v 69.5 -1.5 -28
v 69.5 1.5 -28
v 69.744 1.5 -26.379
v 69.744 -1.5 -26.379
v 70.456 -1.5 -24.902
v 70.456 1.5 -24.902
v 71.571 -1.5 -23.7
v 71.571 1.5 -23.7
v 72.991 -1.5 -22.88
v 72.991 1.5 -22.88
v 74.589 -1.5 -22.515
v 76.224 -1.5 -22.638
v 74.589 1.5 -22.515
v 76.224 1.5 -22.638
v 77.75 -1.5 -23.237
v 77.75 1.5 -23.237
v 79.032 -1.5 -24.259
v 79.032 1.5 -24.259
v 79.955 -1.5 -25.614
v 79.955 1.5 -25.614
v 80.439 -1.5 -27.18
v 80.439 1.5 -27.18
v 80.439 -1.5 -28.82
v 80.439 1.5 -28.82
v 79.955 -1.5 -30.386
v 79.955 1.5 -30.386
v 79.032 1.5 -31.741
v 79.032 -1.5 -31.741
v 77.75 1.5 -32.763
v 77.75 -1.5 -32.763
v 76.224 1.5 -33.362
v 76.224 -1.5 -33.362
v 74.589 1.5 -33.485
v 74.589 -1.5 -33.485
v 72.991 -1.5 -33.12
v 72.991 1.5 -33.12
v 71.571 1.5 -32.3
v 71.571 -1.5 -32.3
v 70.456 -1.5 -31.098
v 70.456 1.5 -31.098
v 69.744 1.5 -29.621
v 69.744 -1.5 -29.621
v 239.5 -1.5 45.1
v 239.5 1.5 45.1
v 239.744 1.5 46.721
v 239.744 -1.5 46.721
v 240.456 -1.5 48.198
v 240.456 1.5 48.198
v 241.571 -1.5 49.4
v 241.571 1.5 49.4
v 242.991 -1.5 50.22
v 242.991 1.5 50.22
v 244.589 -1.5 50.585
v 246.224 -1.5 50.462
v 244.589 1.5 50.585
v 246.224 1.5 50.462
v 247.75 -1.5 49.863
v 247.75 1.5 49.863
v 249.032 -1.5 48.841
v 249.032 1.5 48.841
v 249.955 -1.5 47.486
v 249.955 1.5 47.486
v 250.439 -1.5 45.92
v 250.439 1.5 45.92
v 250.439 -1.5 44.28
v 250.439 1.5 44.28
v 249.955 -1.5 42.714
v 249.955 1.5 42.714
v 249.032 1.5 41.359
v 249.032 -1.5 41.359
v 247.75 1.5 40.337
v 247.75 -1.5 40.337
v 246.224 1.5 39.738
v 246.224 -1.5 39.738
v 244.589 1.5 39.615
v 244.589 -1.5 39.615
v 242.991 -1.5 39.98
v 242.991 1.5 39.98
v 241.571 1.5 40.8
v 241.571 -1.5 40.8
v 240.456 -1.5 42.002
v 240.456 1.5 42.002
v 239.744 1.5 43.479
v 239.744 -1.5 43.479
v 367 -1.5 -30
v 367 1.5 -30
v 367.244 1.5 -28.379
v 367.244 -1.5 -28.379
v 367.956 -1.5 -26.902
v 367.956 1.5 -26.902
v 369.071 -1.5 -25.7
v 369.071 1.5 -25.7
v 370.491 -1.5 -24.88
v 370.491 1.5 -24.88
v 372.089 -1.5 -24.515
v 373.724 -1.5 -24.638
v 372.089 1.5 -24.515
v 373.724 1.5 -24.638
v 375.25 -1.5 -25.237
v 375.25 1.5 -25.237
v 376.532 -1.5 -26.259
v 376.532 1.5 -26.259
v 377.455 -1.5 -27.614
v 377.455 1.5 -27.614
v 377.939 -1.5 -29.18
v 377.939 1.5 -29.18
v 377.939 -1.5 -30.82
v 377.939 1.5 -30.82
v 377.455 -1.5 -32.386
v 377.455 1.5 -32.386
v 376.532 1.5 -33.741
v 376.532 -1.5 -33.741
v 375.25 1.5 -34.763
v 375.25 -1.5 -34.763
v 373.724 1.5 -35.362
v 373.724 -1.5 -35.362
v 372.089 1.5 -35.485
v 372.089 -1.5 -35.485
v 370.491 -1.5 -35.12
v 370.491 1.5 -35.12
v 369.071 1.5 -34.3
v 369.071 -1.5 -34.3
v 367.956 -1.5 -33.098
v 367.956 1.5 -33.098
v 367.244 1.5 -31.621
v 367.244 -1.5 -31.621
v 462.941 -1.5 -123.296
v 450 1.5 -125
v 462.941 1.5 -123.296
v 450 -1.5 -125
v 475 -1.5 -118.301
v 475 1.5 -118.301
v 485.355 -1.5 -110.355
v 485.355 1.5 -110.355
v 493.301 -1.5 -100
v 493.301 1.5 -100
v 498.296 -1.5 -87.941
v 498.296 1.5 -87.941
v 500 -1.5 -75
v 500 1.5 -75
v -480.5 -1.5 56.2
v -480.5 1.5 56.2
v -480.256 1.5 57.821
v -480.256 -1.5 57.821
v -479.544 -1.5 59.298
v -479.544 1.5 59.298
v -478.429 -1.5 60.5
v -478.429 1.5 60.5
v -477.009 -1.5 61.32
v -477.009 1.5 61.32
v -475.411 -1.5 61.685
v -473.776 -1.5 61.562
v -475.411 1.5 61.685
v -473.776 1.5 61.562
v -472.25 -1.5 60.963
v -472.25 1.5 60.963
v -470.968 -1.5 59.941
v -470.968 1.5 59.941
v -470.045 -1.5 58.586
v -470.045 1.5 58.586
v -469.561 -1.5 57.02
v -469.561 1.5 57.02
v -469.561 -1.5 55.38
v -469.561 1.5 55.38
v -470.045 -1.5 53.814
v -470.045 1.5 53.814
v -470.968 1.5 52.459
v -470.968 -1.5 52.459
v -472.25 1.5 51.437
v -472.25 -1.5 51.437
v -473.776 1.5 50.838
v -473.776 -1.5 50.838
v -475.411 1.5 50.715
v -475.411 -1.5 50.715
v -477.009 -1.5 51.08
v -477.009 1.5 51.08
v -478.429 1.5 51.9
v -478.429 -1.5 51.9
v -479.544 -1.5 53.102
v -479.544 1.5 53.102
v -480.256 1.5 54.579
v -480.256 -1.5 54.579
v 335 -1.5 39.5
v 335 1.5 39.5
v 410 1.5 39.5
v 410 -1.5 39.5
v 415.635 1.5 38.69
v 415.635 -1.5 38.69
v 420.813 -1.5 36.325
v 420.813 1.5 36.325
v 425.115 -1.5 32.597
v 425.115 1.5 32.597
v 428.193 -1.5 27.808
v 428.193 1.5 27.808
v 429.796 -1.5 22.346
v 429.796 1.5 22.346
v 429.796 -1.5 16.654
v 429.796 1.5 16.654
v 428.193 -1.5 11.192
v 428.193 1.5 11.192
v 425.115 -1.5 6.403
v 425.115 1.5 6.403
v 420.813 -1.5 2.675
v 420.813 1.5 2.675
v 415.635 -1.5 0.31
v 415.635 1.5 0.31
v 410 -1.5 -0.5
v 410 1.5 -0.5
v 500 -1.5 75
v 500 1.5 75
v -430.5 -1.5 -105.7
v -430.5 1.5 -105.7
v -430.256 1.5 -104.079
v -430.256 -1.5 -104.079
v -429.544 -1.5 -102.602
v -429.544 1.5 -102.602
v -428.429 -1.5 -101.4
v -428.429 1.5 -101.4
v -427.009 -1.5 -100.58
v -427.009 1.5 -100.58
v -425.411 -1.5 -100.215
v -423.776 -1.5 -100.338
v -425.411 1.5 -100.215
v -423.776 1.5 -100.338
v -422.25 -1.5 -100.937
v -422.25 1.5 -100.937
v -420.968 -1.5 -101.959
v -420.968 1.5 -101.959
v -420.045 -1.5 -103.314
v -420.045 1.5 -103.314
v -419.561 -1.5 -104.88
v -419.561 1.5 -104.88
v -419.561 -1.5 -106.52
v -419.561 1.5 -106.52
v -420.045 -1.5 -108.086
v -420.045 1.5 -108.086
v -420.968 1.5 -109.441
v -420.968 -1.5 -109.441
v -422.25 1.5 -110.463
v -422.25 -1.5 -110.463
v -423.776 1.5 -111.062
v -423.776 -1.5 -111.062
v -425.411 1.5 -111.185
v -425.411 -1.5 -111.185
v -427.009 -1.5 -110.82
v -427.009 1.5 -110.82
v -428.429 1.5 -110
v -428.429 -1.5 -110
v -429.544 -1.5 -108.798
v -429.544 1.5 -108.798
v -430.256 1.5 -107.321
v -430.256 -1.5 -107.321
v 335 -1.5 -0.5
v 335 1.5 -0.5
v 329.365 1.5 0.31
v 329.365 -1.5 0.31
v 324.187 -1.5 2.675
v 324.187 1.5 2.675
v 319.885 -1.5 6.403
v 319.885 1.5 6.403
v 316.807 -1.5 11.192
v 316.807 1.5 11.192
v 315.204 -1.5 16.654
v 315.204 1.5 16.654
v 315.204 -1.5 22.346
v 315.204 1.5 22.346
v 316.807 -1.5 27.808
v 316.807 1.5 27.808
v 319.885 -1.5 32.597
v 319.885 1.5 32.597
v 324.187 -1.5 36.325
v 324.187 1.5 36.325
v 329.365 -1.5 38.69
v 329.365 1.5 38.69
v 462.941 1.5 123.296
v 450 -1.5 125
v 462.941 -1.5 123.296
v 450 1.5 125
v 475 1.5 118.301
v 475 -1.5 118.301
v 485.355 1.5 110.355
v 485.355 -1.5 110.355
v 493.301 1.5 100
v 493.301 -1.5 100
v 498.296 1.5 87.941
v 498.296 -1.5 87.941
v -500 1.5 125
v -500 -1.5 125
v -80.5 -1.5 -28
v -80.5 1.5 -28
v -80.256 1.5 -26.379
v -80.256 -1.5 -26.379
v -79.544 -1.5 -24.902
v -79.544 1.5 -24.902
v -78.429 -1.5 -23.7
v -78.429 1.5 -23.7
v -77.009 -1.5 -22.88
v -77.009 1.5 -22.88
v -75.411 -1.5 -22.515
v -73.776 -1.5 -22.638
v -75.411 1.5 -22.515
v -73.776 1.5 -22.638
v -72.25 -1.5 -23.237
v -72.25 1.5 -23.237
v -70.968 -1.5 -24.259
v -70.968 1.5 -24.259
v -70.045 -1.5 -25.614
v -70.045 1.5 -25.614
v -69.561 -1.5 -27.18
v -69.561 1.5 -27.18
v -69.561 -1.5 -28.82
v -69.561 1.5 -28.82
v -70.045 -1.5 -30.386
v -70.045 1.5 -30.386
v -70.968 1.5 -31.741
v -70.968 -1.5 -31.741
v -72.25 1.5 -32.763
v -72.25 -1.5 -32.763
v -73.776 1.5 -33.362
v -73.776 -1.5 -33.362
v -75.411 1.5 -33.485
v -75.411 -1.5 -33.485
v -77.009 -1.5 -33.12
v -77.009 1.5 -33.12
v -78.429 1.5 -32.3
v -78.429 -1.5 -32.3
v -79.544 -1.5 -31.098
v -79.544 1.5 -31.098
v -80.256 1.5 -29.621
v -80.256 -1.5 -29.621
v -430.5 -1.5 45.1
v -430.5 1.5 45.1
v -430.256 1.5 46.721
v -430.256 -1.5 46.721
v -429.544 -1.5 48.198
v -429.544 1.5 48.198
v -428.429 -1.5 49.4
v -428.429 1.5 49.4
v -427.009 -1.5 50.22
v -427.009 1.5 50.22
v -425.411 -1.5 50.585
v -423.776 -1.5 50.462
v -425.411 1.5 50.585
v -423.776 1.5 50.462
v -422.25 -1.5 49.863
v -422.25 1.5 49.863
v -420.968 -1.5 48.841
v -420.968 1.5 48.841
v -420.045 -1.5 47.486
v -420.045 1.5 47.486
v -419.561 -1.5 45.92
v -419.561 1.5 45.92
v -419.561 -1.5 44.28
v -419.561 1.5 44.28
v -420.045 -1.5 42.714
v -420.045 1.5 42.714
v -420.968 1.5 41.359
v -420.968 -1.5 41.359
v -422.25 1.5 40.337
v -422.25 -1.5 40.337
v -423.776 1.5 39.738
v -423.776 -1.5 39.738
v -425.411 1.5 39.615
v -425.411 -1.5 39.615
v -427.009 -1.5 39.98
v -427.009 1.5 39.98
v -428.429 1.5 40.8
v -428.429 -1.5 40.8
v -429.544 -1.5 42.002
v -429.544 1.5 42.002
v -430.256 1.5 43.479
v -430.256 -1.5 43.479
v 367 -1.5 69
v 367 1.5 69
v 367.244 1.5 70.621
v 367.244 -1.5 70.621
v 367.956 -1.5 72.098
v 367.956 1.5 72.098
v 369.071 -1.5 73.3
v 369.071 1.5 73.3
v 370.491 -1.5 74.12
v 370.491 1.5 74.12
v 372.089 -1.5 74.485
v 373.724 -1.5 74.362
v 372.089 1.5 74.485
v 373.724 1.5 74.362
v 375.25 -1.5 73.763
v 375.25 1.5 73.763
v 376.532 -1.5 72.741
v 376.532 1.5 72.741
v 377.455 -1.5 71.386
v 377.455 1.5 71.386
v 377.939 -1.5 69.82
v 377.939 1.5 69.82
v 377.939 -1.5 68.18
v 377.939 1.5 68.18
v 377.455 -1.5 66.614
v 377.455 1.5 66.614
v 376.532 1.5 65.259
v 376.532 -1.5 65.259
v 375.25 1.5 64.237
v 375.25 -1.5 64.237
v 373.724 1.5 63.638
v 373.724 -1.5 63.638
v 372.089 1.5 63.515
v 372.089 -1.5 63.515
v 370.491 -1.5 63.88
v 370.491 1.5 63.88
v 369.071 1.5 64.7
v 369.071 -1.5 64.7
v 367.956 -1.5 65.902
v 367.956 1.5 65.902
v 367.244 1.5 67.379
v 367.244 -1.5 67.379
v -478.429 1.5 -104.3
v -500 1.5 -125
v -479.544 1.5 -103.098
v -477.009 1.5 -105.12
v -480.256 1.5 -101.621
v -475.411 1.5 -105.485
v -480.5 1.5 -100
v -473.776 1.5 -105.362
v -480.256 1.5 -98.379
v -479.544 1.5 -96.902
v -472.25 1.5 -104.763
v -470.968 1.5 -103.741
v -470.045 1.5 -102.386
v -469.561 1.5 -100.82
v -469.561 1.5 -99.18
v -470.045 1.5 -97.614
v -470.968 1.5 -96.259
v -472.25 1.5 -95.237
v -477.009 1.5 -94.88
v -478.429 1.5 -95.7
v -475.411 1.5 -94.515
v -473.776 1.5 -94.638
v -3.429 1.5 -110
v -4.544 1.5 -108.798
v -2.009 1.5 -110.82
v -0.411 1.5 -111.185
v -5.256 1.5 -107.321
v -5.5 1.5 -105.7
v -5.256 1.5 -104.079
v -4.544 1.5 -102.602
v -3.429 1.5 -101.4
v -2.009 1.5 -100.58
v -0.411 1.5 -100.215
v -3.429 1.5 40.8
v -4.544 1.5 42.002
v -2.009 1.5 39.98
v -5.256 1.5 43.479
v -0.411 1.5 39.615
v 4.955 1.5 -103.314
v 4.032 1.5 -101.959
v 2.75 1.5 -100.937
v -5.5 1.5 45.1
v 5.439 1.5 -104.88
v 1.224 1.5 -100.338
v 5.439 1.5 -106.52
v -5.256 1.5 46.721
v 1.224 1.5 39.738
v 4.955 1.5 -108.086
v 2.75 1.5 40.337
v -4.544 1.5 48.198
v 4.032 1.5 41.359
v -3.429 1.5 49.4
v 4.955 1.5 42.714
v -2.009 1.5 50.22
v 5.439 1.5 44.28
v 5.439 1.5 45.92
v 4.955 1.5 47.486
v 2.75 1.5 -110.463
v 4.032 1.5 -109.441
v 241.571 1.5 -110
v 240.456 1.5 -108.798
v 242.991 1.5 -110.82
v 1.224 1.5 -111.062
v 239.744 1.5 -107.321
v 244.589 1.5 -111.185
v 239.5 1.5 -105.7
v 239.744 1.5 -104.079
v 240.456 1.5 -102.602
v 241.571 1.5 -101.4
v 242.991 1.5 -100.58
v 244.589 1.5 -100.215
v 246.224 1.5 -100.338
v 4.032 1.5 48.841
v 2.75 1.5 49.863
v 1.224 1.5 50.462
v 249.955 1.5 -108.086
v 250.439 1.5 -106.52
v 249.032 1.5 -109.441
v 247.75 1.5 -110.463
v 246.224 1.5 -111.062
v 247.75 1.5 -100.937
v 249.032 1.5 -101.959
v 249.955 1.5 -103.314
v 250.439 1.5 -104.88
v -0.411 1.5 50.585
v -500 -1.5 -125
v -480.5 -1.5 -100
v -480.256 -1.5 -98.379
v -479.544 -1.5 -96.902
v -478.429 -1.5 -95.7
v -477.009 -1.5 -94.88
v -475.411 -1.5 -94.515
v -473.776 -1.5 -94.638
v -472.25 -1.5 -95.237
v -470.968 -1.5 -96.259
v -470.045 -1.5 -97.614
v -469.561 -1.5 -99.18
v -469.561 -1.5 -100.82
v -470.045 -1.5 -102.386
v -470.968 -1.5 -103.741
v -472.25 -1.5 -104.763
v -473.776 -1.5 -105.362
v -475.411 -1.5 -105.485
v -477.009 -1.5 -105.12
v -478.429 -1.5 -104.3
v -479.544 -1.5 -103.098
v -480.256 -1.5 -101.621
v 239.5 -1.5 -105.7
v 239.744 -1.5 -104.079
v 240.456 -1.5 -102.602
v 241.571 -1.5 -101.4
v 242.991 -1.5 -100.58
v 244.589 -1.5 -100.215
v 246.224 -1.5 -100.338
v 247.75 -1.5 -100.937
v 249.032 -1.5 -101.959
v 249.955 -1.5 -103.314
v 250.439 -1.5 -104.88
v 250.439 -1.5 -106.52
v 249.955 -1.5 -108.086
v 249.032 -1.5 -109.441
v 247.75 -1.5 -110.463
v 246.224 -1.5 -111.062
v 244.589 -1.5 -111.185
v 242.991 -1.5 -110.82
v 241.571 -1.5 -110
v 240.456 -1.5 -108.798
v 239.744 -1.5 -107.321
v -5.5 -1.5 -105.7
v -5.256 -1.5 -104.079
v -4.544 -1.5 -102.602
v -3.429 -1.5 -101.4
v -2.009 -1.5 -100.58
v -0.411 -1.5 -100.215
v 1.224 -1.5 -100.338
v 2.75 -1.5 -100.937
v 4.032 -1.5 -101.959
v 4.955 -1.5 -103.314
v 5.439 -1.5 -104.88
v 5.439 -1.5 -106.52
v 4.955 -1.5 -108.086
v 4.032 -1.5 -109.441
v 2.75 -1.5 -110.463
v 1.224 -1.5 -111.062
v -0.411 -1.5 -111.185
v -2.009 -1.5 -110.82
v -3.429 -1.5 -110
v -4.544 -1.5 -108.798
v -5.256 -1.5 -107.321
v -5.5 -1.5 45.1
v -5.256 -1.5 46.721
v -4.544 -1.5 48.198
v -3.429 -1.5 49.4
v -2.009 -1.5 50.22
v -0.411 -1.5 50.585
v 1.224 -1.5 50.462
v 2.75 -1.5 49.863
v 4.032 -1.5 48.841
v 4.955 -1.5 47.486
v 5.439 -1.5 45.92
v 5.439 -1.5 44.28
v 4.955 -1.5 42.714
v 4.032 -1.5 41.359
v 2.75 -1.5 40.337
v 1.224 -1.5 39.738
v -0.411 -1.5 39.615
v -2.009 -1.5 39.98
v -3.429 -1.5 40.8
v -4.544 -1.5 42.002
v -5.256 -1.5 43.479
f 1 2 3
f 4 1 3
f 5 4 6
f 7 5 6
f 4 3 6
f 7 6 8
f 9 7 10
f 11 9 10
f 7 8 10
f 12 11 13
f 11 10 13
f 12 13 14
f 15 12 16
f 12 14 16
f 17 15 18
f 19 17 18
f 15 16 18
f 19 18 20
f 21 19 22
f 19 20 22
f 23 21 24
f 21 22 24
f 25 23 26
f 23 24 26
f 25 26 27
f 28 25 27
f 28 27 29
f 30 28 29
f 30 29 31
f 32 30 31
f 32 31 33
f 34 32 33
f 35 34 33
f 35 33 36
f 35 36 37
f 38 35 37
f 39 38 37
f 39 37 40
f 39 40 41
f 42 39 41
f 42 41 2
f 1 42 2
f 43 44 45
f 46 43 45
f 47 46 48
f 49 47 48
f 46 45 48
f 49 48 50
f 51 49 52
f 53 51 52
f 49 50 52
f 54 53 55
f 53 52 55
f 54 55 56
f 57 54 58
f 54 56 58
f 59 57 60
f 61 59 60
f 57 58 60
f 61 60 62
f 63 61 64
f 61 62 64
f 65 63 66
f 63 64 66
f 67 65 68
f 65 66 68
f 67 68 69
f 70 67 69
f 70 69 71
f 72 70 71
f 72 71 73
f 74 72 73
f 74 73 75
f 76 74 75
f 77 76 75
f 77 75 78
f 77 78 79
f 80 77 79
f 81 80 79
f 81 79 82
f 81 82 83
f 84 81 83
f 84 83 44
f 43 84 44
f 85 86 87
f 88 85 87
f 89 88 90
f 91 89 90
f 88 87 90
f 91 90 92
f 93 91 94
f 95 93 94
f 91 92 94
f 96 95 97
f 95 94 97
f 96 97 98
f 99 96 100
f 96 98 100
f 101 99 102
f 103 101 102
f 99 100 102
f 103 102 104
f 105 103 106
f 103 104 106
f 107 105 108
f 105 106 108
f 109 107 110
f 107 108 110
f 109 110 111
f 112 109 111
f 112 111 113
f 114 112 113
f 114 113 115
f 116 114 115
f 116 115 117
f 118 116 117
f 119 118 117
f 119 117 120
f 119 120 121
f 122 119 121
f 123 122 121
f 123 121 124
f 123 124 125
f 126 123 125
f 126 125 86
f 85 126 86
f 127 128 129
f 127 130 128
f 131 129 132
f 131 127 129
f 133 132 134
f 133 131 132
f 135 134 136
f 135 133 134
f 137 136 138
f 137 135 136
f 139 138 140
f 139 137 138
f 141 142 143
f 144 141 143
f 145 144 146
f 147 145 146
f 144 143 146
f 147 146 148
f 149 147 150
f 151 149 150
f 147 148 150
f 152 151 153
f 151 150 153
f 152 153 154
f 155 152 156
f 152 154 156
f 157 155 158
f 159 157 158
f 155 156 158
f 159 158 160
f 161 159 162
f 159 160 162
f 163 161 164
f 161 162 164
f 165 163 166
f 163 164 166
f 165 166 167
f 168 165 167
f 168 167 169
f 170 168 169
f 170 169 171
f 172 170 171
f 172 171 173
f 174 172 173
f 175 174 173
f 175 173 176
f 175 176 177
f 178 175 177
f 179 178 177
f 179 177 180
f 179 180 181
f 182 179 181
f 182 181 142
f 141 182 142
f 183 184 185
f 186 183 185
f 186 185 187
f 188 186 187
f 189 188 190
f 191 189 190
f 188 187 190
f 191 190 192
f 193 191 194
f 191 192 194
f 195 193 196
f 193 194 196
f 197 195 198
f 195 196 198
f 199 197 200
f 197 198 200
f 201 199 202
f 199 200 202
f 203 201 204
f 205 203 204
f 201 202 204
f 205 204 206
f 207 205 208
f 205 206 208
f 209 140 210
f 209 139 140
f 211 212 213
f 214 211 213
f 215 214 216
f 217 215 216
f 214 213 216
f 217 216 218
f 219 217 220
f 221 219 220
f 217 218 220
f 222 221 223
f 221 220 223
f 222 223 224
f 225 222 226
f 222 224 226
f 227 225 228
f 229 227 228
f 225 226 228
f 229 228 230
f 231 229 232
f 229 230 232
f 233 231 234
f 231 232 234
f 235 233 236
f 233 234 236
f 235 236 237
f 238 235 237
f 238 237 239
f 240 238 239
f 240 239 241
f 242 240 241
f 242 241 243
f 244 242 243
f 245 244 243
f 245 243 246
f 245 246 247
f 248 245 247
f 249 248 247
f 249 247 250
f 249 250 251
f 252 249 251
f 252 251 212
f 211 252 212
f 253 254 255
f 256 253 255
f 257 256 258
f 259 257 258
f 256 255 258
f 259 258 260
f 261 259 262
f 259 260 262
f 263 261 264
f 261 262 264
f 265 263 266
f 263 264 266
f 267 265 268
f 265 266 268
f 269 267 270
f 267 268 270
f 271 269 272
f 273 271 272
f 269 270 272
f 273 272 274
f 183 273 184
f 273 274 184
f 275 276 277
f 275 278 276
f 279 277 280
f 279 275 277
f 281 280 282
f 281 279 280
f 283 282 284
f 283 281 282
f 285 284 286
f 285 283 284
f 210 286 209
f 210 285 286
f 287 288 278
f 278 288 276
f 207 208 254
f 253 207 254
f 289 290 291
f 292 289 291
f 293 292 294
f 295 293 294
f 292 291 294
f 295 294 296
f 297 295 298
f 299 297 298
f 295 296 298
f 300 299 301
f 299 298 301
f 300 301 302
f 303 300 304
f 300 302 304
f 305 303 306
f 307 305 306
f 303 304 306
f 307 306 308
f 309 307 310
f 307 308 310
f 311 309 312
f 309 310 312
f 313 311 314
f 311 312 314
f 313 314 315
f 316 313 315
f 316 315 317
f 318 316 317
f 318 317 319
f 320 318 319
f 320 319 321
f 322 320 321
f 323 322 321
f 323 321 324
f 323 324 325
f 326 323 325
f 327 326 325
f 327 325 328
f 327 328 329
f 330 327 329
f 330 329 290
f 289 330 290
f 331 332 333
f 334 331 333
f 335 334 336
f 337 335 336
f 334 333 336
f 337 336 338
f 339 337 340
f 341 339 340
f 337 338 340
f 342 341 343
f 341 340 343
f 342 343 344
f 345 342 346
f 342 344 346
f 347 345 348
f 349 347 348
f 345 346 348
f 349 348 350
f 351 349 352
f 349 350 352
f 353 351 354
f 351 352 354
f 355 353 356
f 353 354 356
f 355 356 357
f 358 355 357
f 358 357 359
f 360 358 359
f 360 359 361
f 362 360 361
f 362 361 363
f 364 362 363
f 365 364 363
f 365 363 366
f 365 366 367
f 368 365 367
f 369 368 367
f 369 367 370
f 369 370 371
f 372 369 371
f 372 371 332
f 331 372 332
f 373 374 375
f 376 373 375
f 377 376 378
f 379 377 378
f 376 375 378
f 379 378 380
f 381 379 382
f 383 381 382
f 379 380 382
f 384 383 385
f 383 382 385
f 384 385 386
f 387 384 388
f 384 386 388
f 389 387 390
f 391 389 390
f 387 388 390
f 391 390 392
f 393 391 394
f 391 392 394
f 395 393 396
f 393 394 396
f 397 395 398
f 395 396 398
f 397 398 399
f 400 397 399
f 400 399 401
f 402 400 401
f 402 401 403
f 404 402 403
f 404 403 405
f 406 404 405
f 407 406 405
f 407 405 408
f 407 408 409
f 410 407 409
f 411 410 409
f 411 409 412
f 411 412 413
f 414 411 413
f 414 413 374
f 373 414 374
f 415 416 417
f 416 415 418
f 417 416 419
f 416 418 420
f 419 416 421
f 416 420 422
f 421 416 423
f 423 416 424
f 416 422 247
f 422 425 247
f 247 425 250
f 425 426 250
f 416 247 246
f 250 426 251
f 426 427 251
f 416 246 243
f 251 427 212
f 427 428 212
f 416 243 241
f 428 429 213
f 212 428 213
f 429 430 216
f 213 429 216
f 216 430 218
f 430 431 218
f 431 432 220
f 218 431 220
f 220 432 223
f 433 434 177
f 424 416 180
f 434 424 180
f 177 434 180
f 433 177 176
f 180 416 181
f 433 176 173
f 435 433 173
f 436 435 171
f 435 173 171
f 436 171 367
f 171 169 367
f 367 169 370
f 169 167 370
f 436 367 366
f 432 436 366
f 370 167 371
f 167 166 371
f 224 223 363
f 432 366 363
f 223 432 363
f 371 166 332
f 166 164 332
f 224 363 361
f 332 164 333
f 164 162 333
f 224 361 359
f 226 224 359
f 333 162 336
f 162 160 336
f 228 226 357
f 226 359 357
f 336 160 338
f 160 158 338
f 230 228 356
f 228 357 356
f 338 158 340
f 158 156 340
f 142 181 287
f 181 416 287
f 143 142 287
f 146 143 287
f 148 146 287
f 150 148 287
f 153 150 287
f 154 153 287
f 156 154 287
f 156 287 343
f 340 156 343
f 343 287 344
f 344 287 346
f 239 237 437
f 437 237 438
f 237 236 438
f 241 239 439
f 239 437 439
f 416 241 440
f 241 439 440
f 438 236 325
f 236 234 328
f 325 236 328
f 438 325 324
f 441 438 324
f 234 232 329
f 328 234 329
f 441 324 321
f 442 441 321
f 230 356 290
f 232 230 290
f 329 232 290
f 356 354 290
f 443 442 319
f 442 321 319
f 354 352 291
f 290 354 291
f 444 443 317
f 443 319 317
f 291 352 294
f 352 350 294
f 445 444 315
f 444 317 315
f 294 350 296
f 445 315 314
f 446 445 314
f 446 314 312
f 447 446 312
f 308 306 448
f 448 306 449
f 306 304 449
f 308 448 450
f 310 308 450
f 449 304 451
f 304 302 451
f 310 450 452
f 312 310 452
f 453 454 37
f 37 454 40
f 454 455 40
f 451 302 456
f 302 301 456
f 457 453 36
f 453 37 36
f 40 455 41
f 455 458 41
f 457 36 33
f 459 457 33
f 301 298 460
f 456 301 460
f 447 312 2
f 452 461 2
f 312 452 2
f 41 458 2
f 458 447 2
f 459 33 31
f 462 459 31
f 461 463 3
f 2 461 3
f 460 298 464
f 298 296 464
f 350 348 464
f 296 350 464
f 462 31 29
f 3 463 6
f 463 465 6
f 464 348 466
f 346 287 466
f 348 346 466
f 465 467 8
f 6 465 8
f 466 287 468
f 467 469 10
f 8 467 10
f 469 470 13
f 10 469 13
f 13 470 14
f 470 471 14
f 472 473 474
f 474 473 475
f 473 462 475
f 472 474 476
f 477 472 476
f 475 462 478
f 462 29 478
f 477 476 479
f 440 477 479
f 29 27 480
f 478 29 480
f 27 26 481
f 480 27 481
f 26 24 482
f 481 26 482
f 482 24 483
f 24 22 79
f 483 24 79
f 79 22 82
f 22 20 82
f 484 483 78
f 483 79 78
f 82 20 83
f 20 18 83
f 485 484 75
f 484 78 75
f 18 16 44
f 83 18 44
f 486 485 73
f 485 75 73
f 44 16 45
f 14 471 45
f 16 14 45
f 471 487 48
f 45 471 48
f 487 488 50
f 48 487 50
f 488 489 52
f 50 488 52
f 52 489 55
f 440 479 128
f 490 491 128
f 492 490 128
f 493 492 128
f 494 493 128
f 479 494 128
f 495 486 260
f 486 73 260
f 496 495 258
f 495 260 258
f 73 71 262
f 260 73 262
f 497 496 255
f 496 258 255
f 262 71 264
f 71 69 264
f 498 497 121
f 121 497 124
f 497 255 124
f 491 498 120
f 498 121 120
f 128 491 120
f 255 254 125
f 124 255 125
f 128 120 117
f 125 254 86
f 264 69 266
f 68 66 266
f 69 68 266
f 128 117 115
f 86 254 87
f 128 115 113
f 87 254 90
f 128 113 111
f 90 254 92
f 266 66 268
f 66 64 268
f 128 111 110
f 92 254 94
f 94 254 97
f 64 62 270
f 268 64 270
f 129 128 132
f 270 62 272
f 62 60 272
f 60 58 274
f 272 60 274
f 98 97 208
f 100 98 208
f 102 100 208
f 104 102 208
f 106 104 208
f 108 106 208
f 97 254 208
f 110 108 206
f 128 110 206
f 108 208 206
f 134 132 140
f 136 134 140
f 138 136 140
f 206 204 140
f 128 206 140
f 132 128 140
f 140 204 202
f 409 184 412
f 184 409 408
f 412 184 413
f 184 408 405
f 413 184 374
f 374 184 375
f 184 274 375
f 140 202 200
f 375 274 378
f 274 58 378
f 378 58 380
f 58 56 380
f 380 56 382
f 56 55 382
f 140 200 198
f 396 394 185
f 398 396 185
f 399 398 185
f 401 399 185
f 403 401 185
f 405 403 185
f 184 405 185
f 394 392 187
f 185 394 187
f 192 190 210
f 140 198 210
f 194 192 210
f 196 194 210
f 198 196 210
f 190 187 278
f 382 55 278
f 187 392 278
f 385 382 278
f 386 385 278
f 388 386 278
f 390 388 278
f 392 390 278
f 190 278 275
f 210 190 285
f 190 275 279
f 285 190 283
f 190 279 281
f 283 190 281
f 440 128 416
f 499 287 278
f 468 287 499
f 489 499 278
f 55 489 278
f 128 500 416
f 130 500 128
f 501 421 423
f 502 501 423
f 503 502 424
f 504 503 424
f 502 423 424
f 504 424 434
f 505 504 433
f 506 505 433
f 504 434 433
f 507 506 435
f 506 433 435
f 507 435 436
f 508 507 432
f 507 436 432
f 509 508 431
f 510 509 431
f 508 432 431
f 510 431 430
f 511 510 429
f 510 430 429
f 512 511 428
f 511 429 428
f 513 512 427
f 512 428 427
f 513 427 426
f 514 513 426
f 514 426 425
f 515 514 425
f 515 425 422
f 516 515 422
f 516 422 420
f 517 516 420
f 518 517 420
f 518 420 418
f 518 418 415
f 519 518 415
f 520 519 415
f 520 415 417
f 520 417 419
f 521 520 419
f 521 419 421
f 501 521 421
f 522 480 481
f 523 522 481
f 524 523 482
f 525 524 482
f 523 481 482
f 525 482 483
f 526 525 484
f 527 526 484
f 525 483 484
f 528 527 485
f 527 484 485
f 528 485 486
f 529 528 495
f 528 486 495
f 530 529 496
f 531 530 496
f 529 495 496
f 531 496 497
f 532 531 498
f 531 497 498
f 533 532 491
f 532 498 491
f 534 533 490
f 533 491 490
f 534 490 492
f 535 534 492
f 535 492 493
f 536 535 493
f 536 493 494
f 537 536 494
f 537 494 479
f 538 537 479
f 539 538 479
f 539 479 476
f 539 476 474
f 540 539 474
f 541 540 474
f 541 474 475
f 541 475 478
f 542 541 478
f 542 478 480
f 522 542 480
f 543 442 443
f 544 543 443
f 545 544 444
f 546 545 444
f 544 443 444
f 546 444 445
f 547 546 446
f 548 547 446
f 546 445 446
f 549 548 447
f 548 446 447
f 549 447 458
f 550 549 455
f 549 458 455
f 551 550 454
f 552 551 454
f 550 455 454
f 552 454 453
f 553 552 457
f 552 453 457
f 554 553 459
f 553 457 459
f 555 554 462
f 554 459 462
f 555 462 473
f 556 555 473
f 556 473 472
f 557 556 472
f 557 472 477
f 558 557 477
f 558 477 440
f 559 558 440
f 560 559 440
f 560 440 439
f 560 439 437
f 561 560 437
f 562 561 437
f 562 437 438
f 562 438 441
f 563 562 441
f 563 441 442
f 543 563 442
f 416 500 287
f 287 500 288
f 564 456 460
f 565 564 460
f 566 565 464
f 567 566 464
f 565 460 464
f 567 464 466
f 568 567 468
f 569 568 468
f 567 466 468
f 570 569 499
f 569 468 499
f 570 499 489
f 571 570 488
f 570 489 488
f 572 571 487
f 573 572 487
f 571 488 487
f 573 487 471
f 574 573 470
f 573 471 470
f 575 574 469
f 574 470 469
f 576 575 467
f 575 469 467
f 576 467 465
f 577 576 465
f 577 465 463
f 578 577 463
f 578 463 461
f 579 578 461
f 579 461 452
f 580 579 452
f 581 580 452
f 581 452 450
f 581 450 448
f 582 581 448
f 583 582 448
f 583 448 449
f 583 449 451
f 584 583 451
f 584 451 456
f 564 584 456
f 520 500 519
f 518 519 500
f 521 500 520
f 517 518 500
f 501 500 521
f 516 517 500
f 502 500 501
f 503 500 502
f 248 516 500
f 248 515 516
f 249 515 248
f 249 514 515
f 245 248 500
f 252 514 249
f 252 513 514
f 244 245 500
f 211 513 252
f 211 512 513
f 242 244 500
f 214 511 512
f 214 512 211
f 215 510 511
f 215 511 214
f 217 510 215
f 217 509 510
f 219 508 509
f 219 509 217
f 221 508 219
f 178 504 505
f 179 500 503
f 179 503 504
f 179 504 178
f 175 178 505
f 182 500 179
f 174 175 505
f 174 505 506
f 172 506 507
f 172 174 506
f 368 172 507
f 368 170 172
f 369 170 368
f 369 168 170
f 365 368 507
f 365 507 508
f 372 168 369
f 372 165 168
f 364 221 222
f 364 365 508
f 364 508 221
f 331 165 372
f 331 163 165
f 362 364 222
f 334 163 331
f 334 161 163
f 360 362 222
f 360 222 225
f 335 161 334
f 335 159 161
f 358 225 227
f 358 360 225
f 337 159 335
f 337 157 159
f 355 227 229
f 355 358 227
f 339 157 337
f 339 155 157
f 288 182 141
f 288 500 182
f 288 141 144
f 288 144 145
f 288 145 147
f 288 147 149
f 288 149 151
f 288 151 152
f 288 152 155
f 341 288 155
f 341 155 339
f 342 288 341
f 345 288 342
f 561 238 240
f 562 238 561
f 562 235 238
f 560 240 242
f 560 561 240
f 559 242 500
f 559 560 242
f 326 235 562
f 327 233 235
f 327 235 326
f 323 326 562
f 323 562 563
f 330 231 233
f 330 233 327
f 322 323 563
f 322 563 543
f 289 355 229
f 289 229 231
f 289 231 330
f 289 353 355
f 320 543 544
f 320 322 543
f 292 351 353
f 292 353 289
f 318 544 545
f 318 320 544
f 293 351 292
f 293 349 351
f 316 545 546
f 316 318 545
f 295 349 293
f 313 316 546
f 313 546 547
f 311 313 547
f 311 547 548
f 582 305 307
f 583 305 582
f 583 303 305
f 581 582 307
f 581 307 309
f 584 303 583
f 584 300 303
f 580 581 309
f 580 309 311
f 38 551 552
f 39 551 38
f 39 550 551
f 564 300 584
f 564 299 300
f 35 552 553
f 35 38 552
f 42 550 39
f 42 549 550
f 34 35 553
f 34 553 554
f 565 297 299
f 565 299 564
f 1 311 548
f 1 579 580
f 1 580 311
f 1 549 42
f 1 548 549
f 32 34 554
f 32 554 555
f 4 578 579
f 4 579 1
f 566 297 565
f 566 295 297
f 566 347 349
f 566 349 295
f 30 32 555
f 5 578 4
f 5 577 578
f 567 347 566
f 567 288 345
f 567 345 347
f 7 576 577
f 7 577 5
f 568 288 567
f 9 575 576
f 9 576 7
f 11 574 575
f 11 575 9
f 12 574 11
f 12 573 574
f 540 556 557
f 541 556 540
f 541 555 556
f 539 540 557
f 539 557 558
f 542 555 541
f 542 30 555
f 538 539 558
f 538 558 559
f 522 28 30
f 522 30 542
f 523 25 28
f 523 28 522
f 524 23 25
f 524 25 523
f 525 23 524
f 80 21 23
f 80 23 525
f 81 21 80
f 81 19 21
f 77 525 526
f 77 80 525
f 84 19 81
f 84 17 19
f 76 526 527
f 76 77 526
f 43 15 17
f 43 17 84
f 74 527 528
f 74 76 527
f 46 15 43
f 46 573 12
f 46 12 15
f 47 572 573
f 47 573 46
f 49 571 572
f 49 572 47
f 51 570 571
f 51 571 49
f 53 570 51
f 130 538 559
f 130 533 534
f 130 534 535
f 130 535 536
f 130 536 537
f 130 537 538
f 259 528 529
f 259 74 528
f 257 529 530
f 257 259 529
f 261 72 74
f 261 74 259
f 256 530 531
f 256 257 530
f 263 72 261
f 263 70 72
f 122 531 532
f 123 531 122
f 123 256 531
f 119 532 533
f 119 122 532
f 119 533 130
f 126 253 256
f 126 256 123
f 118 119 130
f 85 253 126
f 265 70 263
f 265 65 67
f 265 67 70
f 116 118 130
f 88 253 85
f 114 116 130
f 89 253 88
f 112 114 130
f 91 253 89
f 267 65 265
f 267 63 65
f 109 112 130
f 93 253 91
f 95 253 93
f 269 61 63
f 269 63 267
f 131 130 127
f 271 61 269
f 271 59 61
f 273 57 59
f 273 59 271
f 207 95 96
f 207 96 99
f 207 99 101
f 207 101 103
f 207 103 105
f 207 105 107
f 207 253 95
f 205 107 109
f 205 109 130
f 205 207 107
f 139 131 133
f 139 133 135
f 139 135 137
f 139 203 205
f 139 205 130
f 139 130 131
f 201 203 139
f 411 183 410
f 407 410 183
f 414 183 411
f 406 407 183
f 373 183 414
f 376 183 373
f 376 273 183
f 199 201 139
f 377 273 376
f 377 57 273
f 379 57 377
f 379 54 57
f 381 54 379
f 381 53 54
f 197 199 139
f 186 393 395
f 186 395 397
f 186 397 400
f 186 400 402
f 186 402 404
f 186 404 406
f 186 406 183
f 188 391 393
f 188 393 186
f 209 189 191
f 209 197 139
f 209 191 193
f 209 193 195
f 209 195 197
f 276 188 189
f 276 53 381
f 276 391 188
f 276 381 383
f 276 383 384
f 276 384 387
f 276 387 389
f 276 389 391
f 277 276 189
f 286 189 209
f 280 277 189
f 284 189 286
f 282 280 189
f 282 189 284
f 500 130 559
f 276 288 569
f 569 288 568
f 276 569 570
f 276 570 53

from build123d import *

# Parameters (mm, degrees)
F0_W     = 1000
F0_H     = 250
F1_DEPTH = 1.5
F3_D     = 11
F3_DEPTH = 18
F3_TIP   = 3.3047334047
F4_R     = 5.5
F5_DEPTH = 3.001
F6_R     = 50


with BuildPart() as f1:
    # F0 (on Front) → F1 (new body, symmetric)
    with BuildSketch(Plane.XZ):
        Rectangle(F0_W, F0_H)
    extrude(amount=F1_DEPTH, both=True)

    # F3
    with Locations(Plane.XZ.offset(1.5)):
        with Locations((-475, 56.2), (-475, -100), (-425, -105.7), (-425, 45.1), (-75, -28), (75, -28), (0, -105.7), (0, 45.1), (245, 45.1), (245, -105.7)):
            Hole(F3_D / 2, depth=F3_DEPTH)
            with Locations((0, 0, -(F3_DEPTH + F3_TIP / 2))):  # 118° drill point
                Cone(0, F3_D / 2, F3_TIP, mode=Mode.SUBTRACT)

    # F4 (on face) → F5 (cut, through all)
    with BuildSketch(Plane(origin=(0, 1.5, 0), x_dir=(-1, 0, 0), z_dir=(0, 1, 0))):
        with Locations((-372.5, -30)):
            Circle(F4_R)
        with Locations((-372.5, 69)):
            Circle(F4_R)
        with BuildLine():
            ThreePointArc((-410, 39.5), (-430, 19.5), (-410, -0.5))
            Line((-410, -0.5), (-335, -0.5))
            ThreePointArc((-335, -0.5), (-315, 19.5), (-335, 39.5))
            Line((-335, 39.5), (-410, 39.5))
        make_face()
    extrude(amount=-F5_DEPTH, mode=Mode.SUBTRACT)

    # F6
    f6_edges = [f1.edges().sort_by_distance(p)[0] for p in [
        (500, 0, 125),
        (500, 0, -125),
    ]]
    fillet(f6_edges, radius=F6_R)


solid = f1.part
